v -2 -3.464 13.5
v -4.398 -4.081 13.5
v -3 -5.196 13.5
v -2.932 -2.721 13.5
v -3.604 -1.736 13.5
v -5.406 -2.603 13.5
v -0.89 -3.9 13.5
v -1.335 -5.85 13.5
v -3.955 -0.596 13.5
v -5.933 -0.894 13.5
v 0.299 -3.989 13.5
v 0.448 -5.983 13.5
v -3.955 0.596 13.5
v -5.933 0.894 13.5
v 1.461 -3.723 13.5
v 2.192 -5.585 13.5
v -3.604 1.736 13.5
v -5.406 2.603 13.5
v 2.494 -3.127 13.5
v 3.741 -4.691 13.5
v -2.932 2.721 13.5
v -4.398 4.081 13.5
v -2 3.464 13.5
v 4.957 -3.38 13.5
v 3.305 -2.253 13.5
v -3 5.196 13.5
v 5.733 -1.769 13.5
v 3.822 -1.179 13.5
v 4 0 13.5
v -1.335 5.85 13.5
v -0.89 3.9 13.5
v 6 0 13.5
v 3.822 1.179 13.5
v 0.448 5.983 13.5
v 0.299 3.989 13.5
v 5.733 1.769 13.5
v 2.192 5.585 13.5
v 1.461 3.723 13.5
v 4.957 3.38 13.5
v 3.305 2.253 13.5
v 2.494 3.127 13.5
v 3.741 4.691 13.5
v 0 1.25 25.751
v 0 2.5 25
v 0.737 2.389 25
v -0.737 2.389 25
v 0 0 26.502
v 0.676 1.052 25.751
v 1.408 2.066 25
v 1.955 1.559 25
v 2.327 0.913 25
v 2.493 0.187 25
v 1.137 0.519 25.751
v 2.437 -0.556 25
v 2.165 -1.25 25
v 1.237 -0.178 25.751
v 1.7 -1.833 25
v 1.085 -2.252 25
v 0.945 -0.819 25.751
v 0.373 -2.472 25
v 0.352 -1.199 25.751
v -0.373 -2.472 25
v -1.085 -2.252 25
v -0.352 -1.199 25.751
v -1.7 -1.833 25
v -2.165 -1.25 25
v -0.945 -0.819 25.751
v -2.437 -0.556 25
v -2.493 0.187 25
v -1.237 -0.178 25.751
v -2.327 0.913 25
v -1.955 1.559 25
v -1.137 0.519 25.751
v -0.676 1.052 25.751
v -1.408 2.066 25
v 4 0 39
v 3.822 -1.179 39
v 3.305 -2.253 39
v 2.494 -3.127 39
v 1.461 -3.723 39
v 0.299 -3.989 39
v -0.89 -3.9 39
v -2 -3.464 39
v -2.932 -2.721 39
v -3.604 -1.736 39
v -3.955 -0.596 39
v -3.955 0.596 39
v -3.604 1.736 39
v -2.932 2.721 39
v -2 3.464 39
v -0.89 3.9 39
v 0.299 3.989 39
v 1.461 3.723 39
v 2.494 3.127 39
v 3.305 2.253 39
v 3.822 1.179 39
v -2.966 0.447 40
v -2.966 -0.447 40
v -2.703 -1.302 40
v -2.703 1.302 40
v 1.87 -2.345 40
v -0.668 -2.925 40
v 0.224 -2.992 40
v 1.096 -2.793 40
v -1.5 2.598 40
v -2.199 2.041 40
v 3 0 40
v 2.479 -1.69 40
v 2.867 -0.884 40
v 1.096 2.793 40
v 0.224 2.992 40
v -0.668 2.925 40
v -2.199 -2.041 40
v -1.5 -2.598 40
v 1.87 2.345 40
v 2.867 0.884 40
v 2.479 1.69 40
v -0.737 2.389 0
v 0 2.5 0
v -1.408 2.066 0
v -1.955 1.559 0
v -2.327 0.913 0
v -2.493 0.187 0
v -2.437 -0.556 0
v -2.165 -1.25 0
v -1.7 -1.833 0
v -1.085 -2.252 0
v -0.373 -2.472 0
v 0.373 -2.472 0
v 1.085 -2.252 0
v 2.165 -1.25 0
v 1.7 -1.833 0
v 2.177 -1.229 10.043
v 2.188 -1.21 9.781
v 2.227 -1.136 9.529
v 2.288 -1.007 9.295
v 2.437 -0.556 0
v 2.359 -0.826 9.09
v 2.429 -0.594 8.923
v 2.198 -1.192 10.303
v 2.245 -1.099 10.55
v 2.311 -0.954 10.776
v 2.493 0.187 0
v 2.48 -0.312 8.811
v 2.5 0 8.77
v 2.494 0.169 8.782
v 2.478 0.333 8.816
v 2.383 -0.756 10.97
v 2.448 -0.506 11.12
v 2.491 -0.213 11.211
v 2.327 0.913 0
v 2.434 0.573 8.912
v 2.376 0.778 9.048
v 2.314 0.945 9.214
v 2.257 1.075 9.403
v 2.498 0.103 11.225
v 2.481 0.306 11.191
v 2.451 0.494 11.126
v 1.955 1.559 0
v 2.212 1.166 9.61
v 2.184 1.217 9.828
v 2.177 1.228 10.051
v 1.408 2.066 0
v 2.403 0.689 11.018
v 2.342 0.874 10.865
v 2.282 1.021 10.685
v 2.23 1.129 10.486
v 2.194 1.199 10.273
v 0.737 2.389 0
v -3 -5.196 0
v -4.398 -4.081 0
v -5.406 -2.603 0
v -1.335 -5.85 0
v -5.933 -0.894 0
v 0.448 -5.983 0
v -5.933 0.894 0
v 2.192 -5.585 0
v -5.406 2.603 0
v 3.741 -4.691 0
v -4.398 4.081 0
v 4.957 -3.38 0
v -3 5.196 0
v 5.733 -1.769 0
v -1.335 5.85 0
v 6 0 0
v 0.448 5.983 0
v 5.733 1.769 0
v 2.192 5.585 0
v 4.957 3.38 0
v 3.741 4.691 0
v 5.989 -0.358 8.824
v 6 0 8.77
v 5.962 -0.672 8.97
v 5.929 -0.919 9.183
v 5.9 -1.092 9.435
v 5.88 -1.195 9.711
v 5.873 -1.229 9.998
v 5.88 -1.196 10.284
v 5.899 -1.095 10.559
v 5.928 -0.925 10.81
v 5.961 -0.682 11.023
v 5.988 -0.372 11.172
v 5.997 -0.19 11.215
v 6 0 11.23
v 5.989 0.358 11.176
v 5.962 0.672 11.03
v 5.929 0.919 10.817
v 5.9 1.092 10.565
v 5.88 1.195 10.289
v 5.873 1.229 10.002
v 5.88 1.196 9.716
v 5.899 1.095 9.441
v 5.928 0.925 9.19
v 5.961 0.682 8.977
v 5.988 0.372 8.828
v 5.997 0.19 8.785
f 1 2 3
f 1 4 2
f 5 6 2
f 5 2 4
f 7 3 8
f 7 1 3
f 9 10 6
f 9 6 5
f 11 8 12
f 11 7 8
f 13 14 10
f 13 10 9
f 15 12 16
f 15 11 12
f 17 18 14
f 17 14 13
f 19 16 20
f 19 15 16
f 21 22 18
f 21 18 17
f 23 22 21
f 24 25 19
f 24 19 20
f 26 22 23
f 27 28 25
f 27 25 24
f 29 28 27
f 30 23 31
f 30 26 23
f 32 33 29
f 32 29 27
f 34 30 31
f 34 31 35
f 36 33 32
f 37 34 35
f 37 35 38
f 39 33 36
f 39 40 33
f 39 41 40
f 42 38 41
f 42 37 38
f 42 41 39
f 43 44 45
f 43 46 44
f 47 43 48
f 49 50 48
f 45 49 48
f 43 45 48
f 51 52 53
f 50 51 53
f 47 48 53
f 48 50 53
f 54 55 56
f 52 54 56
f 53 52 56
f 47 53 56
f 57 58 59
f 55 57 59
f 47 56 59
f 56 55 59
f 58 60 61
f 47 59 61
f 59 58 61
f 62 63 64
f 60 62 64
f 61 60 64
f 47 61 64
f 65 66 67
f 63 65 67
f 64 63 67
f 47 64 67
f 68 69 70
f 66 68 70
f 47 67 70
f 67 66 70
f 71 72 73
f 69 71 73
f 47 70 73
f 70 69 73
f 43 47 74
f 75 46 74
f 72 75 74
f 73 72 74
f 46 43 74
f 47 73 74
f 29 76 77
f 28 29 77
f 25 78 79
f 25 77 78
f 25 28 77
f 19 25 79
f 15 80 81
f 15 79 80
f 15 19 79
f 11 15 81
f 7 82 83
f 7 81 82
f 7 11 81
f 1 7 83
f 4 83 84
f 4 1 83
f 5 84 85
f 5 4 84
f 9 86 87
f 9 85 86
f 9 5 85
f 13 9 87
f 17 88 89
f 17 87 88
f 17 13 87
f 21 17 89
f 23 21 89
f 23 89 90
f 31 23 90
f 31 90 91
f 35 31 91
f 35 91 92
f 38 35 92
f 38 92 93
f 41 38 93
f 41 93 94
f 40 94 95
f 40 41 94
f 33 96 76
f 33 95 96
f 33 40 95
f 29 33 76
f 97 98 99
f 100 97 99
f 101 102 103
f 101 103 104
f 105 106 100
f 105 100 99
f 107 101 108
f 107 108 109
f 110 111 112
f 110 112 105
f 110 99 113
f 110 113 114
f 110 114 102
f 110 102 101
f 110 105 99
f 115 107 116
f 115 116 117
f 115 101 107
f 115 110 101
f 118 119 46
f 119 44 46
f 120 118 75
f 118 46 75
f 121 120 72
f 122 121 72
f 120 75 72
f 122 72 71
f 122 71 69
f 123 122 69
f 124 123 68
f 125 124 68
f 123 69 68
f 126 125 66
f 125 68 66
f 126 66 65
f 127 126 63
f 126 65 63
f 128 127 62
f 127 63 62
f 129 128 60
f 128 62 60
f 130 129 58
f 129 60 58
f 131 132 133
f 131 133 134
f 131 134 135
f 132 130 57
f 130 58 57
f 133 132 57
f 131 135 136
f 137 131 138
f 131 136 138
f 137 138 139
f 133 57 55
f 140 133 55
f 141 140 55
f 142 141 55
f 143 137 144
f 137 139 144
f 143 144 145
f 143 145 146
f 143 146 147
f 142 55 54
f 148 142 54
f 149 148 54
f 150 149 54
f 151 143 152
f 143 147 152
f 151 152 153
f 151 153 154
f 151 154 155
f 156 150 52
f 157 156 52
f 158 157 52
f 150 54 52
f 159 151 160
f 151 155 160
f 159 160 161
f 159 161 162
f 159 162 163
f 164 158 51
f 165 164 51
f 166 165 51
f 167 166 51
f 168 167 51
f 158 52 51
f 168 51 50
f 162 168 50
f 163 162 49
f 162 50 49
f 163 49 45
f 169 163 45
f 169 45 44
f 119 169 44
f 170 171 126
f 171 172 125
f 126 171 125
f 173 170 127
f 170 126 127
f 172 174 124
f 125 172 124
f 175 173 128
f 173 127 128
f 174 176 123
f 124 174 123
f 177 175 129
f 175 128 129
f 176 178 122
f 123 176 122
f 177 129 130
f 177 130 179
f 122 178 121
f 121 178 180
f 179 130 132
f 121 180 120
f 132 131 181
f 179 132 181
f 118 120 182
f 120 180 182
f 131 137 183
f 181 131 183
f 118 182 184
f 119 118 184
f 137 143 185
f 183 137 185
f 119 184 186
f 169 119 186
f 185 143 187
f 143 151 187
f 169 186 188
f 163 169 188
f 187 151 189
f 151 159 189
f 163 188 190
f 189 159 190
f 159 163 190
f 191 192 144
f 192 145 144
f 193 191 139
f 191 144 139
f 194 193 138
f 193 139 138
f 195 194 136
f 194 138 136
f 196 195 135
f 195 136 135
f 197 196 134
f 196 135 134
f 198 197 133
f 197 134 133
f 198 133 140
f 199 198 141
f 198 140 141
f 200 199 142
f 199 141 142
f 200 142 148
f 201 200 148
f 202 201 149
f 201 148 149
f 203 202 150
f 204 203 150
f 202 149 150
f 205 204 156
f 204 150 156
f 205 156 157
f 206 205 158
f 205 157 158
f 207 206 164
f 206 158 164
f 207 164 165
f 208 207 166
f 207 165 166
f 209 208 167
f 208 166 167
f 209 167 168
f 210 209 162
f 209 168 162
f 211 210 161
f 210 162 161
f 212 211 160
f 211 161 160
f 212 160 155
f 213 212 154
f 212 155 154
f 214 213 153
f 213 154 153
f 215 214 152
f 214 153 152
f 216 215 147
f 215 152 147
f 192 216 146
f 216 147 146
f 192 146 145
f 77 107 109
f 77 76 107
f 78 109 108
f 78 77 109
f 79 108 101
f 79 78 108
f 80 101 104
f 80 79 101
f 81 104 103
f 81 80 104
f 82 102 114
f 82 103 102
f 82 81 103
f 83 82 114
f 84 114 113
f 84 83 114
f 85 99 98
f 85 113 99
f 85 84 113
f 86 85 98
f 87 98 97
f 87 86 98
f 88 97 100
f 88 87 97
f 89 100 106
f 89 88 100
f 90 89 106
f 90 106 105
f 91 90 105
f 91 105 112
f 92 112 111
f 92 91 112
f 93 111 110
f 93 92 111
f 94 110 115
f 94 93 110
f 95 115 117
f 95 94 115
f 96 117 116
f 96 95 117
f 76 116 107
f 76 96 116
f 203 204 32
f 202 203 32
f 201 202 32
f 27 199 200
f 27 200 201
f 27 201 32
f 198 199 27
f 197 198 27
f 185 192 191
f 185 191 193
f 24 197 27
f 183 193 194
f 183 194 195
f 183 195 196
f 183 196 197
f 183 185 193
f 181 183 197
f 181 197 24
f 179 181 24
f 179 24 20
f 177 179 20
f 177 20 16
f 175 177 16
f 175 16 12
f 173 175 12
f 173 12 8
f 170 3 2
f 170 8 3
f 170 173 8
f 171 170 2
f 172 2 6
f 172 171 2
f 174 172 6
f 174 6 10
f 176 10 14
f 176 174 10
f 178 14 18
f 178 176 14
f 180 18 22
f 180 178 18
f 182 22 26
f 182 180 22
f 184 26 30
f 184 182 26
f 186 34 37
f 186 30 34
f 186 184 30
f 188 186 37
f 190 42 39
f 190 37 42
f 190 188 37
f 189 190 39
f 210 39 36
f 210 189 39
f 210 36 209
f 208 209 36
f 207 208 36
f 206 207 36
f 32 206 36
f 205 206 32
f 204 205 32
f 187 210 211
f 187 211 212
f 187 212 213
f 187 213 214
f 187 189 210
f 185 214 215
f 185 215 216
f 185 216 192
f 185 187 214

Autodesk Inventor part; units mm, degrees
ref_plane "XZ Plane" through (0, 0, 0) normal (0, 1, 0) x (-1, 0, 0)
ref_plane "XY Plane" through (0, 0, 0) normal (0, 0, 1) x (1, 0, 0)
sketch "Skizze1" plane through (0, 0, 0) normal (0, 0, 1) x (1, 0, 0)
  circle A0 centre (0, 0) radius 6
  dimension "d0" = 12
extrude "Extrusion1" add sketch "Skizze1" along normal blind 13.5
sketch "Skizze2" plane through (0, 0, 13.5) normal (0, 0, 1) x (1, 0, 0)
  circle A0 centre (0, 0) radius 6 projected
  circle A1 centre (0, 0) radius 4
  dimension "d3" = 8
extrude "Extrusion2" add sketch "Skizze2" along normal blind 26.5 contours A1
sketch "Skizze3" plane through (0, 0, 0) normal (0, 0, -1) x (-1, 0, 0)
  circle A0 centre (0, 0) radius 6 projected
hole "Bohrung1" at (0, 0, 0) direction (0, 0, 1) diameter 5 depth 25 tip angle 118
ref_plane "Arbeitsebene1" through (6, 0, 0) normal (1, 0, 0) x (0, 1, 0)
sketch "Skizze4" plane through (6, 0, 0) normal (1, 0, 0) x (0, 1, 0)
  line L0 (-8.4, 0) -> (8.4, 0) projected
  line L1 (0, -2.7) -> (0, 16.2) projected
  point P0 (0, 0)
  point P1 (0, 10)
  dimension "d13" = 10
hole "Bohrung2" at (6, 0, 10) direction (-1, 0, 0) diameter 2.459 end up to surface thread size "M3x0.5" class "6H" standard "ISO Metric profile"
chamfer "Fase1" distance 1 angle 45 1 edges at (-4, 0, 40)
properties part number "13_0204_062"
